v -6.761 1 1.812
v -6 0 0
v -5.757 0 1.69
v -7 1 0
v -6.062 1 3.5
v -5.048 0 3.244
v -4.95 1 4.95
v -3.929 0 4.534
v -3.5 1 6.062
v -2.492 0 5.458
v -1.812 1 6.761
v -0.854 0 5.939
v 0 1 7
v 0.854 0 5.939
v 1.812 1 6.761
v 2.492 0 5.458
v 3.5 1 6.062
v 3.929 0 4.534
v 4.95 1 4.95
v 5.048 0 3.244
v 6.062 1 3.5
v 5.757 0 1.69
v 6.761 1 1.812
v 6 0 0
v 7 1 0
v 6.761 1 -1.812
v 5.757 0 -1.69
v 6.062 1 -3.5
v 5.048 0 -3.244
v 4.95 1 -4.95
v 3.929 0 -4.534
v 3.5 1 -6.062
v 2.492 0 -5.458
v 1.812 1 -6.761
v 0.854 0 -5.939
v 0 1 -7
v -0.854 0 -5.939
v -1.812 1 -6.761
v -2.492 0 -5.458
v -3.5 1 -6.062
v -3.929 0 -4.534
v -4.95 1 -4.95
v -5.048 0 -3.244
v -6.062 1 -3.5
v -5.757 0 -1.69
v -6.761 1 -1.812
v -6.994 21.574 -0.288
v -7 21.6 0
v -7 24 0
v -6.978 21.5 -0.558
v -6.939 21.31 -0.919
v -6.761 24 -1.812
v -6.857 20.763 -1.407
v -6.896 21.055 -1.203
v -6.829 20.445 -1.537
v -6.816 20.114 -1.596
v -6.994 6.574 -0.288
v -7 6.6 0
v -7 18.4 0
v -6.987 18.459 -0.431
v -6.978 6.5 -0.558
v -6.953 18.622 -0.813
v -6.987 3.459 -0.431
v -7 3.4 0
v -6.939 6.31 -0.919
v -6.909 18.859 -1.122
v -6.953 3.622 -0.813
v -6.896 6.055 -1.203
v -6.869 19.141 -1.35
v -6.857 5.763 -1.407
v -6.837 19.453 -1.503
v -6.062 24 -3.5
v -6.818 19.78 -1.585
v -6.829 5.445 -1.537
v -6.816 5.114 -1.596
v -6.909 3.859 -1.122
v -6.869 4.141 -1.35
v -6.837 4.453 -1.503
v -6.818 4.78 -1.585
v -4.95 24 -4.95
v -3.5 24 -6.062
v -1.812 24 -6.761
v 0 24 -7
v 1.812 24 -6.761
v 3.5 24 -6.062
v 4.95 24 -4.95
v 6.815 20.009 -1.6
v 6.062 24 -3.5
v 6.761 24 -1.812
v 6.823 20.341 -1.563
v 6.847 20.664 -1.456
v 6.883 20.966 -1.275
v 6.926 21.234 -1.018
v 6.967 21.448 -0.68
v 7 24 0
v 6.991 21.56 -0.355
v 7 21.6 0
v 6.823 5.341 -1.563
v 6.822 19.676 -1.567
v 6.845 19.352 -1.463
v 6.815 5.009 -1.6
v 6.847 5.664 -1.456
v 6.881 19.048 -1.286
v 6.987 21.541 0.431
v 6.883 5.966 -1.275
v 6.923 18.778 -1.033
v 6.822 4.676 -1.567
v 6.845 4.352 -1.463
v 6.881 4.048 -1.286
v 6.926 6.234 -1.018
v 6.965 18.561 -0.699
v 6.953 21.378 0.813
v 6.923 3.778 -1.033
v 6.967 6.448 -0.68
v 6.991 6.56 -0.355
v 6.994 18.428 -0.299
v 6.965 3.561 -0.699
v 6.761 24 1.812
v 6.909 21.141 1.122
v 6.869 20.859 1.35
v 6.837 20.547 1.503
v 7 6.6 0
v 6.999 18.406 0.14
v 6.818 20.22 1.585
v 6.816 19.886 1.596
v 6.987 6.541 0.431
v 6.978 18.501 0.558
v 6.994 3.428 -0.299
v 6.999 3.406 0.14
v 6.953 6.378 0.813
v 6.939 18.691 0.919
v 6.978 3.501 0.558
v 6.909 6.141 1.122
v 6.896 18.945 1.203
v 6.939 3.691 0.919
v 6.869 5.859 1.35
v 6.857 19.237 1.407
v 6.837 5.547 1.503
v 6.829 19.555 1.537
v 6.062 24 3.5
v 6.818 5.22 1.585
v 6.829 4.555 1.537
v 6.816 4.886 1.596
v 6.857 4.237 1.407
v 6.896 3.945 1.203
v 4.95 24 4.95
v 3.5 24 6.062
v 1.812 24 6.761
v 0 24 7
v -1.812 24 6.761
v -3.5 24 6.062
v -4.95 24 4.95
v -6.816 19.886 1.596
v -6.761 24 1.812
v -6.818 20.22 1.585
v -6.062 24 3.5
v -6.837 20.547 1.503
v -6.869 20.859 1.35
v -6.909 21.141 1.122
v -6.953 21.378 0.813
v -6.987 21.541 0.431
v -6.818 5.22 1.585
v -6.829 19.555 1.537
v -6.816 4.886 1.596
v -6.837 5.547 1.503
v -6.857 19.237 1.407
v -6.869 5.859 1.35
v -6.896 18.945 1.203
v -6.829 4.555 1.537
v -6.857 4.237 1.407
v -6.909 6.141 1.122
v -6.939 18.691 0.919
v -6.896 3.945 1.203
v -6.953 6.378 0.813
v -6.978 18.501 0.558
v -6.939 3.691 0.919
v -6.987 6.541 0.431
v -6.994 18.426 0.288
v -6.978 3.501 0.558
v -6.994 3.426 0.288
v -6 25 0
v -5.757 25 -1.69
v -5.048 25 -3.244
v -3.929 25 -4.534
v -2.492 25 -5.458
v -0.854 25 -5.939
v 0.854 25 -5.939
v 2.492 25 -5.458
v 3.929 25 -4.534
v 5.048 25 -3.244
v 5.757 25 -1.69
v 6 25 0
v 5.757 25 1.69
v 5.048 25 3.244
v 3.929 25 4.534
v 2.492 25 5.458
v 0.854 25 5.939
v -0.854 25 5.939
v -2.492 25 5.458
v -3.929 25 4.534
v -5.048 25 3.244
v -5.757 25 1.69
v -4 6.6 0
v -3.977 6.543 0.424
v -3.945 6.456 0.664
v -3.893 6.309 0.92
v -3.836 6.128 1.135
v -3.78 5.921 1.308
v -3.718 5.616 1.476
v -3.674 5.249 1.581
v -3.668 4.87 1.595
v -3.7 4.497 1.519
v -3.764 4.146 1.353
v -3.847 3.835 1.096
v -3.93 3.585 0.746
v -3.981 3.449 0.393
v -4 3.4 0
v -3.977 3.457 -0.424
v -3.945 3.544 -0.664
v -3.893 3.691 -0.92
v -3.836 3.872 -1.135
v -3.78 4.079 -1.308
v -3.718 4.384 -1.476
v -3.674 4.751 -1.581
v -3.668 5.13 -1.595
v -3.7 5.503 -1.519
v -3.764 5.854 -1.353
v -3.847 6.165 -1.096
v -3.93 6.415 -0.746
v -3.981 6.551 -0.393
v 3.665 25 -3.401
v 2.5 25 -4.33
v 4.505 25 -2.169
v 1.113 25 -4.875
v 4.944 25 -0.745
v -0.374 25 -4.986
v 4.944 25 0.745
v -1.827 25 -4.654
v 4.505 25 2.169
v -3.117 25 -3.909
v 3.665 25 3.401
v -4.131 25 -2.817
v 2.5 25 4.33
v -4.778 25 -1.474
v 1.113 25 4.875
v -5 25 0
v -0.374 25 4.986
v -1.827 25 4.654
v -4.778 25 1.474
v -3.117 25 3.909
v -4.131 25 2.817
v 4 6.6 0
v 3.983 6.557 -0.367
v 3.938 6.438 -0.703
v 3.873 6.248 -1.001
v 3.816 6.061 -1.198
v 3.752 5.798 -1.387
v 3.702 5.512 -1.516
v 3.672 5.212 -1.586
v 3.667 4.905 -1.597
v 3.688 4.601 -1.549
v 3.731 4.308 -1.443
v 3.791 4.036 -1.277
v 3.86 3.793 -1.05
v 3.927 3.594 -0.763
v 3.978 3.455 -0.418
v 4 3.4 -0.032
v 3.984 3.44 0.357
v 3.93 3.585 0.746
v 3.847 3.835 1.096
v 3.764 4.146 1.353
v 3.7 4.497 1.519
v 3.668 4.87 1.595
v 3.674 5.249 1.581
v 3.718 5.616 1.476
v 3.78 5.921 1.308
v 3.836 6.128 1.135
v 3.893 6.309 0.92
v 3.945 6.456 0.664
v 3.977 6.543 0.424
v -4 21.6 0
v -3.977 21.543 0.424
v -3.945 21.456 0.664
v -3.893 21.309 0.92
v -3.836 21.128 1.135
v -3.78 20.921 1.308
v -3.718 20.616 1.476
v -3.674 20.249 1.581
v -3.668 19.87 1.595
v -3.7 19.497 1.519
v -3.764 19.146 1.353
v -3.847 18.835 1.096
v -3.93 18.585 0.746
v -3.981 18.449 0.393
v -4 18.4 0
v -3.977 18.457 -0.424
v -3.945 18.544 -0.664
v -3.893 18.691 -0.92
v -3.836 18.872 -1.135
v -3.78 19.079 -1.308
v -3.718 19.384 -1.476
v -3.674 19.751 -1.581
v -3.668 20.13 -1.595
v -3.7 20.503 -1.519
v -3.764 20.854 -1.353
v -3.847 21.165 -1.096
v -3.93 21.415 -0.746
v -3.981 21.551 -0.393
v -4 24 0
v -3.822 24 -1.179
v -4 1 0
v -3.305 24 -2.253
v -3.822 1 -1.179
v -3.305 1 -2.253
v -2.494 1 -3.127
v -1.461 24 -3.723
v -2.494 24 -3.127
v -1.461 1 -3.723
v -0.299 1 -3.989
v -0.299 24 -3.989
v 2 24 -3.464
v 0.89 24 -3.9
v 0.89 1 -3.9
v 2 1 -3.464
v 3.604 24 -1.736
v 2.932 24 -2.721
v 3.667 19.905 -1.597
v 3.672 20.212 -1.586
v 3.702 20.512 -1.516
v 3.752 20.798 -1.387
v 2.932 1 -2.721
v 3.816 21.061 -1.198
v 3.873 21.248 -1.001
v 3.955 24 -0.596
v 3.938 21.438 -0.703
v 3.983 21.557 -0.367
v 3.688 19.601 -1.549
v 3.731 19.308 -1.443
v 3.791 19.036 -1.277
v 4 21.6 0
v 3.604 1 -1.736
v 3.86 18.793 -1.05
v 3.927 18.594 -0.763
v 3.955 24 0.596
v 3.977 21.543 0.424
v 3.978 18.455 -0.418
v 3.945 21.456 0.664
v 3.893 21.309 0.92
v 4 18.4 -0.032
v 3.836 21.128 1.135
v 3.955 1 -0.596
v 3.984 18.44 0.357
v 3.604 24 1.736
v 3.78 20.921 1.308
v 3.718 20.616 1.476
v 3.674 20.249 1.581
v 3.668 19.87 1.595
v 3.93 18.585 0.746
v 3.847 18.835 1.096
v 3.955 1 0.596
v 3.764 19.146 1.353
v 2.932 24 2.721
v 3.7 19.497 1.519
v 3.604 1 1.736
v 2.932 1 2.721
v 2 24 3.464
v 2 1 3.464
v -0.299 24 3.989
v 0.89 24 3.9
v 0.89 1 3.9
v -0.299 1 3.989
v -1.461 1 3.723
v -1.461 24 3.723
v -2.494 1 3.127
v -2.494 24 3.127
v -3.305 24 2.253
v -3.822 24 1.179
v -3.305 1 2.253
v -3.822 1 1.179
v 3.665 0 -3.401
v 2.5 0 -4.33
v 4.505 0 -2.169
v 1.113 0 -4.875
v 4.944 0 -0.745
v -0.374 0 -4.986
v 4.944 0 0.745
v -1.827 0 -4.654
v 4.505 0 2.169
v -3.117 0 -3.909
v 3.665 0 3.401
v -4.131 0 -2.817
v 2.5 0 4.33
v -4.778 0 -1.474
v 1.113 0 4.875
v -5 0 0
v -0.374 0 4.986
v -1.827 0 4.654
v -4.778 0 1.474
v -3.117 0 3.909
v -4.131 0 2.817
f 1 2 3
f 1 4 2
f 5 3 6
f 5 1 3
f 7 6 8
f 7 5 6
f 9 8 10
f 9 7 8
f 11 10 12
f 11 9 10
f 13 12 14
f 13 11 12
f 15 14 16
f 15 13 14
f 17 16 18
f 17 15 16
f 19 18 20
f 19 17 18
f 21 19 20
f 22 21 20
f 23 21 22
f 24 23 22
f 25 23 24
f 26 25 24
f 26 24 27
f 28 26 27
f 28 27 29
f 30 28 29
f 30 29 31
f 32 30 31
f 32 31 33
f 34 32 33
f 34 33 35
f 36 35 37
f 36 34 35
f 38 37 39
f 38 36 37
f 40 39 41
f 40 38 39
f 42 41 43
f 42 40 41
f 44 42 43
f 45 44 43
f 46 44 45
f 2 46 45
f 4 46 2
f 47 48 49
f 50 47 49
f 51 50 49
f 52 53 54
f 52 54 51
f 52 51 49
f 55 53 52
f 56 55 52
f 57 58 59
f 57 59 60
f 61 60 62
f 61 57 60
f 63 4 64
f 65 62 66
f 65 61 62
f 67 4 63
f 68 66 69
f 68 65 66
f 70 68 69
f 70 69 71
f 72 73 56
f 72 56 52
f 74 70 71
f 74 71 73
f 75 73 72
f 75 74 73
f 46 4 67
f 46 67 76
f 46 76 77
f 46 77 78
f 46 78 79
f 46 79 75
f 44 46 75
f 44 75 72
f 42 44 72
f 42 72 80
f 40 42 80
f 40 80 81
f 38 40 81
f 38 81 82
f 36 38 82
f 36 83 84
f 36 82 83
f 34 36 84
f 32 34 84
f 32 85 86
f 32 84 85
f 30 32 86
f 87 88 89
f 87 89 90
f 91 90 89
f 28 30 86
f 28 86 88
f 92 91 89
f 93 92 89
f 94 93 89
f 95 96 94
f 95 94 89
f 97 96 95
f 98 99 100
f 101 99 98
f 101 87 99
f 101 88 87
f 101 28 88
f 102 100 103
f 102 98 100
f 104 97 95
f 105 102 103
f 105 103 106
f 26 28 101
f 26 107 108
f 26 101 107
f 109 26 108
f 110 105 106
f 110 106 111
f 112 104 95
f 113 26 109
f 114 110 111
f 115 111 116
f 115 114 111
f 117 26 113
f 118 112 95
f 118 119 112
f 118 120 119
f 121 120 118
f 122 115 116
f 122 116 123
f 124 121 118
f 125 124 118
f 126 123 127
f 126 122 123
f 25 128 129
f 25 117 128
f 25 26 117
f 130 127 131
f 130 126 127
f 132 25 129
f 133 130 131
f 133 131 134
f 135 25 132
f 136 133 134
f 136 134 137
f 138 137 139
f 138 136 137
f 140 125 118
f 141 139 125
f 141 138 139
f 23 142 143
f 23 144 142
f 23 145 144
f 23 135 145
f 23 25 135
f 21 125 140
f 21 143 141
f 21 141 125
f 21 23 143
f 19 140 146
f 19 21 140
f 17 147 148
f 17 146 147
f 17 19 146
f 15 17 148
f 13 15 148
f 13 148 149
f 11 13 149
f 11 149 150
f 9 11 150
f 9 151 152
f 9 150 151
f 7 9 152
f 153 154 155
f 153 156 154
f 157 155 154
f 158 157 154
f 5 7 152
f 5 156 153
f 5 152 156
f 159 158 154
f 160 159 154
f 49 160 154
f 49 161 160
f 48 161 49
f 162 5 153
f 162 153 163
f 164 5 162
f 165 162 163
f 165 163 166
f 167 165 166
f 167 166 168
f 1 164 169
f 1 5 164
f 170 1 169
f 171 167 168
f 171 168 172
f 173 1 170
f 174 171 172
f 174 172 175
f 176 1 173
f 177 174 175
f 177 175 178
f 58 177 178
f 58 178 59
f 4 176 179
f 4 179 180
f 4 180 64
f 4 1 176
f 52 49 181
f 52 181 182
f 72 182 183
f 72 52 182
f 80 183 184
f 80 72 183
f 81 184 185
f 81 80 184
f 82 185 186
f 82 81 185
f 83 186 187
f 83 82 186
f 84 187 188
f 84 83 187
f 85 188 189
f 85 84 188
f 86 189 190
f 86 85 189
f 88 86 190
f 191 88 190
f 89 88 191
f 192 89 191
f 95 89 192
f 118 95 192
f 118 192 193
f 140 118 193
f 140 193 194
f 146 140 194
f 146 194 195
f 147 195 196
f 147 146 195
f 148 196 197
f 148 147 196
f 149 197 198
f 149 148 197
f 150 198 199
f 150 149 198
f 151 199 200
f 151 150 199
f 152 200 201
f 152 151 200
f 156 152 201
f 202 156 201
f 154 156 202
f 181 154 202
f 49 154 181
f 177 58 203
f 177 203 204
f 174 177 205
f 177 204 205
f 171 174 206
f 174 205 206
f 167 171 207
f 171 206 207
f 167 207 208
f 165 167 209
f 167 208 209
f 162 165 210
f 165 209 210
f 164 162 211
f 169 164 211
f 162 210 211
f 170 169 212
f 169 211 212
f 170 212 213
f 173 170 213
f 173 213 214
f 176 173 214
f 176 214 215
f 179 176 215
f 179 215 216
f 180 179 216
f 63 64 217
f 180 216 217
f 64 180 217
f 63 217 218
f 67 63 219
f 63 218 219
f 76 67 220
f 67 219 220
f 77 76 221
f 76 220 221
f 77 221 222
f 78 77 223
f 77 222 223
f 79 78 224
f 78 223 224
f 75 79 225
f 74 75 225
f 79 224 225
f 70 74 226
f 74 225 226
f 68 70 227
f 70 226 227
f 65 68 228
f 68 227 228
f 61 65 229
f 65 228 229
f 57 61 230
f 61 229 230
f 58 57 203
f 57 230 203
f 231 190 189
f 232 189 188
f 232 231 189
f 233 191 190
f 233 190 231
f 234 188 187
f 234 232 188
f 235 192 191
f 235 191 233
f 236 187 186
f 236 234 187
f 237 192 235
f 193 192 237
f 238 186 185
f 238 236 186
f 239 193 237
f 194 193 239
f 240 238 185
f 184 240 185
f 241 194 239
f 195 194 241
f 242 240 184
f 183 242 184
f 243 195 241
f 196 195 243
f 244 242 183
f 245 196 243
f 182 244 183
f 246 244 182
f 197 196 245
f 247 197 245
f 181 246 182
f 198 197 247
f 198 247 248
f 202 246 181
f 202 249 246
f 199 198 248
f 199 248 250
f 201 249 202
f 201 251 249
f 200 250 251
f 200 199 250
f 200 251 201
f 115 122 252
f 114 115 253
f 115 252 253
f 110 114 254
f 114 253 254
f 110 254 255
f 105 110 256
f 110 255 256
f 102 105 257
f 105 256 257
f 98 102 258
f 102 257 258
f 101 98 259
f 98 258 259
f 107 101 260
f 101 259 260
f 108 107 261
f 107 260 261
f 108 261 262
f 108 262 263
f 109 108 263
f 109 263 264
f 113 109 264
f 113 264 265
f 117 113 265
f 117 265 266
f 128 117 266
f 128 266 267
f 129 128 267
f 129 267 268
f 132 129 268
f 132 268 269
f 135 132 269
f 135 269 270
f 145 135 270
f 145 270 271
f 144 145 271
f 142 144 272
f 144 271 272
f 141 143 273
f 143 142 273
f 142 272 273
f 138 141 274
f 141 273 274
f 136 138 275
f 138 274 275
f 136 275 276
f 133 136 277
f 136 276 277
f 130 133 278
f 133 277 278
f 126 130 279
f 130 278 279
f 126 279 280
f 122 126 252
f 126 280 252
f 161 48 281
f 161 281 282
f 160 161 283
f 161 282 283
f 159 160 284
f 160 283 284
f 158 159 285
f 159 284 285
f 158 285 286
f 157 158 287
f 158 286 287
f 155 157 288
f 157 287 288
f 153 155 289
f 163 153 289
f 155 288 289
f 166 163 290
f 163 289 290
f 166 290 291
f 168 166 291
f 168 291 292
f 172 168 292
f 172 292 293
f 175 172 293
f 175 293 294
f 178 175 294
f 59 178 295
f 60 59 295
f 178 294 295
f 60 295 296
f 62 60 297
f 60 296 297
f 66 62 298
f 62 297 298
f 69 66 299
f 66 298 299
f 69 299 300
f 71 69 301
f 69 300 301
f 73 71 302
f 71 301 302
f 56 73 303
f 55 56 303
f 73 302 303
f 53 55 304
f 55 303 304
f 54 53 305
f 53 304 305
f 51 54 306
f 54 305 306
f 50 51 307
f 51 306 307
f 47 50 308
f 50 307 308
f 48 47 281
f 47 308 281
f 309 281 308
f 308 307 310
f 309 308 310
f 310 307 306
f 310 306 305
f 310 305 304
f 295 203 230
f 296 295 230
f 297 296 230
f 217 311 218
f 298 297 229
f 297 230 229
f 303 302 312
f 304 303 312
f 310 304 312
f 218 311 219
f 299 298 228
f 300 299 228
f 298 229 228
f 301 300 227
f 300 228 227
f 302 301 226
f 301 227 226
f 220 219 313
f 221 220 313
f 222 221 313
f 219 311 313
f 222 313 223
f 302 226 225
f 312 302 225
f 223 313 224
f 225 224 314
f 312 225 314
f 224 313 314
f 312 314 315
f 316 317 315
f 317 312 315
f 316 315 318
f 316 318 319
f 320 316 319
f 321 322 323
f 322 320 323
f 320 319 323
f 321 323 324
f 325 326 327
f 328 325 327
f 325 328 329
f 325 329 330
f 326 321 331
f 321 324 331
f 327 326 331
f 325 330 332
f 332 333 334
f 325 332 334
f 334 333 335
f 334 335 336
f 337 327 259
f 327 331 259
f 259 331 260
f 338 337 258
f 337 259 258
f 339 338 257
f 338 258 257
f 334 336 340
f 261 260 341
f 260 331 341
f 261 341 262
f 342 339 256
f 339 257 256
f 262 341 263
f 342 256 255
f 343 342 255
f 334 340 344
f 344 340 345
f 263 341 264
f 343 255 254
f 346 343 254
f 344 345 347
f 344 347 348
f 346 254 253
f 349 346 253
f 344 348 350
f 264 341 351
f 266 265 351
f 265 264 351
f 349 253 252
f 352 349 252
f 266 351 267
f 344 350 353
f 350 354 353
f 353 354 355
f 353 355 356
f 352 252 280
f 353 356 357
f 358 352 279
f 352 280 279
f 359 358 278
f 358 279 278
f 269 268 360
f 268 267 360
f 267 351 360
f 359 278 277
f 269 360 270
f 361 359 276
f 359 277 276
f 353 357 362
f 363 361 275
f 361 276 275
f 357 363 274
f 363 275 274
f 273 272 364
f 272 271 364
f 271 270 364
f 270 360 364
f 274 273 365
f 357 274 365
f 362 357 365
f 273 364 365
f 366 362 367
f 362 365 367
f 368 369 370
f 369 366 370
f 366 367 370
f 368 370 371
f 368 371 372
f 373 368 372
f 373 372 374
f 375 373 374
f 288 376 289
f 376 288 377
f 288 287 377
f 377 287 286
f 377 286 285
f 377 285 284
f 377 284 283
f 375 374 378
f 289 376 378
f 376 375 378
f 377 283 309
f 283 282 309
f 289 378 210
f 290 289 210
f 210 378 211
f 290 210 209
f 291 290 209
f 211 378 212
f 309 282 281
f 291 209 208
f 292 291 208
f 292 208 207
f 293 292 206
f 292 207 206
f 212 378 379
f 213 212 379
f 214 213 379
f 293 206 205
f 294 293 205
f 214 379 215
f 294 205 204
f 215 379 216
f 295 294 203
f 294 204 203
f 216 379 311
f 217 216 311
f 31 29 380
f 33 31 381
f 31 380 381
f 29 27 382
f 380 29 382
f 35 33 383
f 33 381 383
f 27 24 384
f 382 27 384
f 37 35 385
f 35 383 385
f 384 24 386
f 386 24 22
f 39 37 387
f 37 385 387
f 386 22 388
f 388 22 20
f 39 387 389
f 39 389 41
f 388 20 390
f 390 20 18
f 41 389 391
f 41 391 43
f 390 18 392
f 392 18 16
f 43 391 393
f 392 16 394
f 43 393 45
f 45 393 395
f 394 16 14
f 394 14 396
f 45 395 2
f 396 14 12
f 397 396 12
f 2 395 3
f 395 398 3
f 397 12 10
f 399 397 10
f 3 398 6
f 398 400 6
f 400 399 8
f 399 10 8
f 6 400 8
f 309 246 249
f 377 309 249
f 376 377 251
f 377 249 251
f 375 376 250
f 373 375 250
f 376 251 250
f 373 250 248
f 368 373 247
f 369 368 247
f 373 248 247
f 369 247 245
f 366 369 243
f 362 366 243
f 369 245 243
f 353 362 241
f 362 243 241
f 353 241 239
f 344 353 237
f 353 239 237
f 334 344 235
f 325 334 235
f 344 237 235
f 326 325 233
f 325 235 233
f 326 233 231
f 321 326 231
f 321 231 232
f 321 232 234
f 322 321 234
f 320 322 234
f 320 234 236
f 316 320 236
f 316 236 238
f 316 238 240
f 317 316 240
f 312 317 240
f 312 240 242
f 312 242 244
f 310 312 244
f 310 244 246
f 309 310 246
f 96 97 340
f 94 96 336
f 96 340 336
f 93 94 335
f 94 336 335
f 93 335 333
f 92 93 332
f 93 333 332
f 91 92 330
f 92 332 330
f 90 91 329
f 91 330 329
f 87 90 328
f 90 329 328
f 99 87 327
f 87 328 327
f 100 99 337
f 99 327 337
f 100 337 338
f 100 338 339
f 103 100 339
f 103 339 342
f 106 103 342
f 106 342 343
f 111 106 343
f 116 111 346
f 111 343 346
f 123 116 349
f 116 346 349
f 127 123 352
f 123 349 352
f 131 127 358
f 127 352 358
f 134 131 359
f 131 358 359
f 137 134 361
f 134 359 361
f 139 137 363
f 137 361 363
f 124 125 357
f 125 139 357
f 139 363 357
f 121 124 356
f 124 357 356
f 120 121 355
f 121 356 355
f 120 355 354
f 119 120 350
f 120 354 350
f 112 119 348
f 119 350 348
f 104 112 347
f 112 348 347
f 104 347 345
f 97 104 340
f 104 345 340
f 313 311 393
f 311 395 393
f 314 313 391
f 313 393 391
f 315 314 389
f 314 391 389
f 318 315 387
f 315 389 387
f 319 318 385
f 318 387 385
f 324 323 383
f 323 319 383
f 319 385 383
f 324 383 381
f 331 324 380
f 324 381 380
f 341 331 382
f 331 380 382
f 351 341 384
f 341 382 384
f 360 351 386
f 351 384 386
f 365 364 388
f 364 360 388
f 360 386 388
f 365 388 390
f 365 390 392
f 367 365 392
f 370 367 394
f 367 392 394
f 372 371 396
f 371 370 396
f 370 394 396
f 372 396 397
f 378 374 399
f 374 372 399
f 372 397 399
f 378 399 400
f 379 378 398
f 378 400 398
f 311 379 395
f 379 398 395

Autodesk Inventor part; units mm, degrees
ref_plane "YZ Plane" through (0, 0, 0) normal (1, 0, 0) x (0, 1, 0)
ref_plane "XZ Plane" through (0, 0, 0) normal (0, 1, 0) x (-1, 0, 0)
ref_plane "XY Plane" through (0, 0, 0) normal (0, 0, 1) x (1, 0, 0)
sketch "Sketch1" plane through (0, 0, 0) normal (0, 1, 0) x (-1, 0, 0)
  circle A0 centre (0, 0) radius 4
  circle A1 centre (0, 0) radius 7
  dimension "d0" = 8
  dimension "d1" = 14
extrude "Extrusion1" add sketch "Sketch1" along normal blind 25
chamfer "Chamfer1" distance 1 angle 45 4 edges at (7, 25, 0) (7, 0, 0) (4, 25, 0) (4, 0, 0)
sketch "Sketch2" plane through (0, 0, 0) normal (1, 0, 0) x (0, 1, 0)
  circle A0 centre (20, 0) radius 1.6
  circle A1 centre (5, 0) radius 1.6
  line L0 (0, 0) -> (25, 0)
  line L1 (25, 6) -> (25, -6) projected
  line L2 (0, -6) -> (0, 6) projected
  dimension "d7" = 3.2
  dimension "d8" = 3.2
  dimension "d9" = 5
  dimension "d10" = 5
extrude "Extrusion2" cut sketch "Sketch2" along normal mid plane 25
properties part number "Acople"
